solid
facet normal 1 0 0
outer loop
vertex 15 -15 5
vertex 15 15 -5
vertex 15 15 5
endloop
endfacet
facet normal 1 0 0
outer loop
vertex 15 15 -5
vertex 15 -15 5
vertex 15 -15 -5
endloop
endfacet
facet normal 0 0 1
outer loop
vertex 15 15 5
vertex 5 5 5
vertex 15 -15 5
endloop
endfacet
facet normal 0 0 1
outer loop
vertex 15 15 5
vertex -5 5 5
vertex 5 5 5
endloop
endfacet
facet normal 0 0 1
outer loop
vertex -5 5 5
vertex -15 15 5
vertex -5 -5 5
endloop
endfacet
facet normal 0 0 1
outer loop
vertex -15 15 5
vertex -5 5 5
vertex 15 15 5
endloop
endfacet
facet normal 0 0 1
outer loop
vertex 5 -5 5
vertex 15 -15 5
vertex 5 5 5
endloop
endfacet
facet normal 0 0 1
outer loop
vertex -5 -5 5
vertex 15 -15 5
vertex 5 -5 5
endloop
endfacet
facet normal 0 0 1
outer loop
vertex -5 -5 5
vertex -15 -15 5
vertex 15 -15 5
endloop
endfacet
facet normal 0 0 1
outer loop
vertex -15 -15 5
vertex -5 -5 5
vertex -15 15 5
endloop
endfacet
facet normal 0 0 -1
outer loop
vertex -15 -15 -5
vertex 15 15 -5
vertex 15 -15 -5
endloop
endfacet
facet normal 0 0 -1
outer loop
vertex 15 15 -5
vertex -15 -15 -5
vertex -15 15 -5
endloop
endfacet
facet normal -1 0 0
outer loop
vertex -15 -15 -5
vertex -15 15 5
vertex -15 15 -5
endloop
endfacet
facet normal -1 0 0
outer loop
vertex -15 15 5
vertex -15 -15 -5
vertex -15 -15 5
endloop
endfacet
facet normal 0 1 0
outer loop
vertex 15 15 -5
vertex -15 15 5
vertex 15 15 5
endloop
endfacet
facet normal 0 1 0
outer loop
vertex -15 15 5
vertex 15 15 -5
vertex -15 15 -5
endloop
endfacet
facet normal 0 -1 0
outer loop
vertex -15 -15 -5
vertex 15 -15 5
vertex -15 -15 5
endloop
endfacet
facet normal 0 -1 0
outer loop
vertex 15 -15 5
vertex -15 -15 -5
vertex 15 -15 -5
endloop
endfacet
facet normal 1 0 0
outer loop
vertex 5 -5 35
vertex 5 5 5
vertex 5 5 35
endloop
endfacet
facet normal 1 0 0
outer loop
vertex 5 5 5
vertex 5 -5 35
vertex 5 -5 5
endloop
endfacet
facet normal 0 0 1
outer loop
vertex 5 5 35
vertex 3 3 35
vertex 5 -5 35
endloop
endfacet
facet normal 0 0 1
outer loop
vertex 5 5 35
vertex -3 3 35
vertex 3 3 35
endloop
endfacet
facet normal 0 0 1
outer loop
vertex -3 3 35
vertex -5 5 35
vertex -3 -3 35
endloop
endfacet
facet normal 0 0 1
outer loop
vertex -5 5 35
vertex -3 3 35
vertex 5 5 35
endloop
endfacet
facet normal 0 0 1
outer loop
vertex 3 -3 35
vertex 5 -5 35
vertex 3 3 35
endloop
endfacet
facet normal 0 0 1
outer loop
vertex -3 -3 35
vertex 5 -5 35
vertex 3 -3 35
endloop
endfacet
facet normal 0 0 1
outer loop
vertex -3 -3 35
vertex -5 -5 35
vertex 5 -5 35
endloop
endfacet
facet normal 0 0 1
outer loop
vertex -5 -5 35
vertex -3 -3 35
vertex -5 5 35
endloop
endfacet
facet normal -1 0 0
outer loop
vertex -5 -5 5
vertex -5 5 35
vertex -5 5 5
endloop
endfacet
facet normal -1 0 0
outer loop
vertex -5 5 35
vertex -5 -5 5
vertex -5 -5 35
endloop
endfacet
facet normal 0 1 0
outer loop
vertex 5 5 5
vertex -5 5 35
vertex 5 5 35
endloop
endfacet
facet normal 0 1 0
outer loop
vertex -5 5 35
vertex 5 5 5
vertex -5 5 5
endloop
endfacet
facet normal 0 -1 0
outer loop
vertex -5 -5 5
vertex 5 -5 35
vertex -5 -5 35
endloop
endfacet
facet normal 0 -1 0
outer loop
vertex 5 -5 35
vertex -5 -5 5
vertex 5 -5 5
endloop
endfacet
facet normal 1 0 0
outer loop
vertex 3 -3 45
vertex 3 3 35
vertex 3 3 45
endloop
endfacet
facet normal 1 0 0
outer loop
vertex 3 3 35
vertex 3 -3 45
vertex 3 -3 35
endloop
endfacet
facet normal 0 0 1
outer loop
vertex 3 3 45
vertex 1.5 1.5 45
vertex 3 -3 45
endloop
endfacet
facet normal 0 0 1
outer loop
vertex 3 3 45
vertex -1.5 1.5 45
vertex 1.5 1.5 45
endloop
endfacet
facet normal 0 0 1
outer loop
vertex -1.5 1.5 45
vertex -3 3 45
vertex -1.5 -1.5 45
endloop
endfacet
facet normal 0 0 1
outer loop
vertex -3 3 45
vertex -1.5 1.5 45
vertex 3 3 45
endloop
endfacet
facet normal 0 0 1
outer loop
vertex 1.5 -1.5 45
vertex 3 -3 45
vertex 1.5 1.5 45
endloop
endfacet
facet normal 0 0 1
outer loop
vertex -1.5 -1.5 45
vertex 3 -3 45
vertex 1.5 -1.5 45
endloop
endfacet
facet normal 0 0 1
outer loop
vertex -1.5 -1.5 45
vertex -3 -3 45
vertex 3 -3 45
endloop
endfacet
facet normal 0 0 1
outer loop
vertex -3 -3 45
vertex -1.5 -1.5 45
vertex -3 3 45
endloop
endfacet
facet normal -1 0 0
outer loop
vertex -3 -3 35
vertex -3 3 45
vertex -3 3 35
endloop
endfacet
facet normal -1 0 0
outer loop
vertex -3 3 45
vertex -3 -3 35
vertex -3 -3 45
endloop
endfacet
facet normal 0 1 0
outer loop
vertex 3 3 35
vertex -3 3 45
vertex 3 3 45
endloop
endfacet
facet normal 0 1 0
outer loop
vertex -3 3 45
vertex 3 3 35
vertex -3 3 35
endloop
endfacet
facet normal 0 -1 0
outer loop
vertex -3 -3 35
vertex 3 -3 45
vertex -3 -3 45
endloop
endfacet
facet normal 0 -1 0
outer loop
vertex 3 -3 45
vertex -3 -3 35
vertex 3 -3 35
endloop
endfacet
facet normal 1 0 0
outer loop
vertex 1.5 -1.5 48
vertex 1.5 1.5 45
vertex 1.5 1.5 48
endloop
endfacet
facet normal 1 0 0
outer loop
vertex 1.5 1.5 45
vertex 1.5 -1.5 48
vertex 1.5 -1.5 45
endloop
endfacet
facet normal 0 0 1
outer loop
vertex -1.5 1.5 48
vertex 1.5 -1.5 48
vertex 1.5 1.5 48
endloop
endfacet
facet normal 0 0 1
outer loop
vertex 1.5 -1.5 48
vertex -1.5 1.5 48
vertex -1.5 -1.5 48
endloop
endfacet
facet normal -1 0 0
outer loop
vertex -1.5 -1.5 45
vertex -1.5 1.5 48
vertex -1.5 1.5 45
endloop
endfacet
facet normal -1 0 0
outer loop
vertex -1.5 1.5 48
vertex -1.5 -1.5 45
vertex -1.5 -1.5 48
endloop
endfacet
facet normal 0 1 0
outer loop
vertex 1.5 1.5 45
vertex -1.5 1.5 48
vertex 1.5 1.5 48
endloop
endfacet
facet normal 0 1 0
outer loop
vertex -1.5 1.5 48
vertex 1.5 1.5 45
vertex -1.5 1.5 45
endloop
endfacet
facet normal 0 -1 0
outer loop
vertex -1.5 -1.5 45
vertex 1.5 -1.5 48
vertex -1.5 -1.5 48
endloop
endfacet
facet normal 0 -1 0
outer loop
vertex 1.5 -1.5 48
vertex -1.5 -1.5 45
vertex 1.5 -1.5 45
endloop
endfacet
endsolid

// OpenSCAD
//-- Definiciones componentes X, Y y Z
X=0;
Y=1;
Z=2;

//-- Dimensiones de los cubos
A=[30,30,10];
B=[10,10,30];
C=[6,6,10];
D=[3,3,3];

//-- Calcular posición
posB=[0,0,A[Z]/2+B[Z]/2];
posC=posB+[0,0,B[Z]/2+C[Z]/2];
posD=posC+[0,0,C[Z]/2+D[Z]/2];

//-- Poner cubo A
cube(A,center=true);

//-- Poner B encima de A
translate(posB)
    cube(B,center=true);

//-- Poner C encima de B
translate(posC)
    cube(C,center=true);

//-- Poner D encima de C
translate(posD)
    cube(D,center=true);
